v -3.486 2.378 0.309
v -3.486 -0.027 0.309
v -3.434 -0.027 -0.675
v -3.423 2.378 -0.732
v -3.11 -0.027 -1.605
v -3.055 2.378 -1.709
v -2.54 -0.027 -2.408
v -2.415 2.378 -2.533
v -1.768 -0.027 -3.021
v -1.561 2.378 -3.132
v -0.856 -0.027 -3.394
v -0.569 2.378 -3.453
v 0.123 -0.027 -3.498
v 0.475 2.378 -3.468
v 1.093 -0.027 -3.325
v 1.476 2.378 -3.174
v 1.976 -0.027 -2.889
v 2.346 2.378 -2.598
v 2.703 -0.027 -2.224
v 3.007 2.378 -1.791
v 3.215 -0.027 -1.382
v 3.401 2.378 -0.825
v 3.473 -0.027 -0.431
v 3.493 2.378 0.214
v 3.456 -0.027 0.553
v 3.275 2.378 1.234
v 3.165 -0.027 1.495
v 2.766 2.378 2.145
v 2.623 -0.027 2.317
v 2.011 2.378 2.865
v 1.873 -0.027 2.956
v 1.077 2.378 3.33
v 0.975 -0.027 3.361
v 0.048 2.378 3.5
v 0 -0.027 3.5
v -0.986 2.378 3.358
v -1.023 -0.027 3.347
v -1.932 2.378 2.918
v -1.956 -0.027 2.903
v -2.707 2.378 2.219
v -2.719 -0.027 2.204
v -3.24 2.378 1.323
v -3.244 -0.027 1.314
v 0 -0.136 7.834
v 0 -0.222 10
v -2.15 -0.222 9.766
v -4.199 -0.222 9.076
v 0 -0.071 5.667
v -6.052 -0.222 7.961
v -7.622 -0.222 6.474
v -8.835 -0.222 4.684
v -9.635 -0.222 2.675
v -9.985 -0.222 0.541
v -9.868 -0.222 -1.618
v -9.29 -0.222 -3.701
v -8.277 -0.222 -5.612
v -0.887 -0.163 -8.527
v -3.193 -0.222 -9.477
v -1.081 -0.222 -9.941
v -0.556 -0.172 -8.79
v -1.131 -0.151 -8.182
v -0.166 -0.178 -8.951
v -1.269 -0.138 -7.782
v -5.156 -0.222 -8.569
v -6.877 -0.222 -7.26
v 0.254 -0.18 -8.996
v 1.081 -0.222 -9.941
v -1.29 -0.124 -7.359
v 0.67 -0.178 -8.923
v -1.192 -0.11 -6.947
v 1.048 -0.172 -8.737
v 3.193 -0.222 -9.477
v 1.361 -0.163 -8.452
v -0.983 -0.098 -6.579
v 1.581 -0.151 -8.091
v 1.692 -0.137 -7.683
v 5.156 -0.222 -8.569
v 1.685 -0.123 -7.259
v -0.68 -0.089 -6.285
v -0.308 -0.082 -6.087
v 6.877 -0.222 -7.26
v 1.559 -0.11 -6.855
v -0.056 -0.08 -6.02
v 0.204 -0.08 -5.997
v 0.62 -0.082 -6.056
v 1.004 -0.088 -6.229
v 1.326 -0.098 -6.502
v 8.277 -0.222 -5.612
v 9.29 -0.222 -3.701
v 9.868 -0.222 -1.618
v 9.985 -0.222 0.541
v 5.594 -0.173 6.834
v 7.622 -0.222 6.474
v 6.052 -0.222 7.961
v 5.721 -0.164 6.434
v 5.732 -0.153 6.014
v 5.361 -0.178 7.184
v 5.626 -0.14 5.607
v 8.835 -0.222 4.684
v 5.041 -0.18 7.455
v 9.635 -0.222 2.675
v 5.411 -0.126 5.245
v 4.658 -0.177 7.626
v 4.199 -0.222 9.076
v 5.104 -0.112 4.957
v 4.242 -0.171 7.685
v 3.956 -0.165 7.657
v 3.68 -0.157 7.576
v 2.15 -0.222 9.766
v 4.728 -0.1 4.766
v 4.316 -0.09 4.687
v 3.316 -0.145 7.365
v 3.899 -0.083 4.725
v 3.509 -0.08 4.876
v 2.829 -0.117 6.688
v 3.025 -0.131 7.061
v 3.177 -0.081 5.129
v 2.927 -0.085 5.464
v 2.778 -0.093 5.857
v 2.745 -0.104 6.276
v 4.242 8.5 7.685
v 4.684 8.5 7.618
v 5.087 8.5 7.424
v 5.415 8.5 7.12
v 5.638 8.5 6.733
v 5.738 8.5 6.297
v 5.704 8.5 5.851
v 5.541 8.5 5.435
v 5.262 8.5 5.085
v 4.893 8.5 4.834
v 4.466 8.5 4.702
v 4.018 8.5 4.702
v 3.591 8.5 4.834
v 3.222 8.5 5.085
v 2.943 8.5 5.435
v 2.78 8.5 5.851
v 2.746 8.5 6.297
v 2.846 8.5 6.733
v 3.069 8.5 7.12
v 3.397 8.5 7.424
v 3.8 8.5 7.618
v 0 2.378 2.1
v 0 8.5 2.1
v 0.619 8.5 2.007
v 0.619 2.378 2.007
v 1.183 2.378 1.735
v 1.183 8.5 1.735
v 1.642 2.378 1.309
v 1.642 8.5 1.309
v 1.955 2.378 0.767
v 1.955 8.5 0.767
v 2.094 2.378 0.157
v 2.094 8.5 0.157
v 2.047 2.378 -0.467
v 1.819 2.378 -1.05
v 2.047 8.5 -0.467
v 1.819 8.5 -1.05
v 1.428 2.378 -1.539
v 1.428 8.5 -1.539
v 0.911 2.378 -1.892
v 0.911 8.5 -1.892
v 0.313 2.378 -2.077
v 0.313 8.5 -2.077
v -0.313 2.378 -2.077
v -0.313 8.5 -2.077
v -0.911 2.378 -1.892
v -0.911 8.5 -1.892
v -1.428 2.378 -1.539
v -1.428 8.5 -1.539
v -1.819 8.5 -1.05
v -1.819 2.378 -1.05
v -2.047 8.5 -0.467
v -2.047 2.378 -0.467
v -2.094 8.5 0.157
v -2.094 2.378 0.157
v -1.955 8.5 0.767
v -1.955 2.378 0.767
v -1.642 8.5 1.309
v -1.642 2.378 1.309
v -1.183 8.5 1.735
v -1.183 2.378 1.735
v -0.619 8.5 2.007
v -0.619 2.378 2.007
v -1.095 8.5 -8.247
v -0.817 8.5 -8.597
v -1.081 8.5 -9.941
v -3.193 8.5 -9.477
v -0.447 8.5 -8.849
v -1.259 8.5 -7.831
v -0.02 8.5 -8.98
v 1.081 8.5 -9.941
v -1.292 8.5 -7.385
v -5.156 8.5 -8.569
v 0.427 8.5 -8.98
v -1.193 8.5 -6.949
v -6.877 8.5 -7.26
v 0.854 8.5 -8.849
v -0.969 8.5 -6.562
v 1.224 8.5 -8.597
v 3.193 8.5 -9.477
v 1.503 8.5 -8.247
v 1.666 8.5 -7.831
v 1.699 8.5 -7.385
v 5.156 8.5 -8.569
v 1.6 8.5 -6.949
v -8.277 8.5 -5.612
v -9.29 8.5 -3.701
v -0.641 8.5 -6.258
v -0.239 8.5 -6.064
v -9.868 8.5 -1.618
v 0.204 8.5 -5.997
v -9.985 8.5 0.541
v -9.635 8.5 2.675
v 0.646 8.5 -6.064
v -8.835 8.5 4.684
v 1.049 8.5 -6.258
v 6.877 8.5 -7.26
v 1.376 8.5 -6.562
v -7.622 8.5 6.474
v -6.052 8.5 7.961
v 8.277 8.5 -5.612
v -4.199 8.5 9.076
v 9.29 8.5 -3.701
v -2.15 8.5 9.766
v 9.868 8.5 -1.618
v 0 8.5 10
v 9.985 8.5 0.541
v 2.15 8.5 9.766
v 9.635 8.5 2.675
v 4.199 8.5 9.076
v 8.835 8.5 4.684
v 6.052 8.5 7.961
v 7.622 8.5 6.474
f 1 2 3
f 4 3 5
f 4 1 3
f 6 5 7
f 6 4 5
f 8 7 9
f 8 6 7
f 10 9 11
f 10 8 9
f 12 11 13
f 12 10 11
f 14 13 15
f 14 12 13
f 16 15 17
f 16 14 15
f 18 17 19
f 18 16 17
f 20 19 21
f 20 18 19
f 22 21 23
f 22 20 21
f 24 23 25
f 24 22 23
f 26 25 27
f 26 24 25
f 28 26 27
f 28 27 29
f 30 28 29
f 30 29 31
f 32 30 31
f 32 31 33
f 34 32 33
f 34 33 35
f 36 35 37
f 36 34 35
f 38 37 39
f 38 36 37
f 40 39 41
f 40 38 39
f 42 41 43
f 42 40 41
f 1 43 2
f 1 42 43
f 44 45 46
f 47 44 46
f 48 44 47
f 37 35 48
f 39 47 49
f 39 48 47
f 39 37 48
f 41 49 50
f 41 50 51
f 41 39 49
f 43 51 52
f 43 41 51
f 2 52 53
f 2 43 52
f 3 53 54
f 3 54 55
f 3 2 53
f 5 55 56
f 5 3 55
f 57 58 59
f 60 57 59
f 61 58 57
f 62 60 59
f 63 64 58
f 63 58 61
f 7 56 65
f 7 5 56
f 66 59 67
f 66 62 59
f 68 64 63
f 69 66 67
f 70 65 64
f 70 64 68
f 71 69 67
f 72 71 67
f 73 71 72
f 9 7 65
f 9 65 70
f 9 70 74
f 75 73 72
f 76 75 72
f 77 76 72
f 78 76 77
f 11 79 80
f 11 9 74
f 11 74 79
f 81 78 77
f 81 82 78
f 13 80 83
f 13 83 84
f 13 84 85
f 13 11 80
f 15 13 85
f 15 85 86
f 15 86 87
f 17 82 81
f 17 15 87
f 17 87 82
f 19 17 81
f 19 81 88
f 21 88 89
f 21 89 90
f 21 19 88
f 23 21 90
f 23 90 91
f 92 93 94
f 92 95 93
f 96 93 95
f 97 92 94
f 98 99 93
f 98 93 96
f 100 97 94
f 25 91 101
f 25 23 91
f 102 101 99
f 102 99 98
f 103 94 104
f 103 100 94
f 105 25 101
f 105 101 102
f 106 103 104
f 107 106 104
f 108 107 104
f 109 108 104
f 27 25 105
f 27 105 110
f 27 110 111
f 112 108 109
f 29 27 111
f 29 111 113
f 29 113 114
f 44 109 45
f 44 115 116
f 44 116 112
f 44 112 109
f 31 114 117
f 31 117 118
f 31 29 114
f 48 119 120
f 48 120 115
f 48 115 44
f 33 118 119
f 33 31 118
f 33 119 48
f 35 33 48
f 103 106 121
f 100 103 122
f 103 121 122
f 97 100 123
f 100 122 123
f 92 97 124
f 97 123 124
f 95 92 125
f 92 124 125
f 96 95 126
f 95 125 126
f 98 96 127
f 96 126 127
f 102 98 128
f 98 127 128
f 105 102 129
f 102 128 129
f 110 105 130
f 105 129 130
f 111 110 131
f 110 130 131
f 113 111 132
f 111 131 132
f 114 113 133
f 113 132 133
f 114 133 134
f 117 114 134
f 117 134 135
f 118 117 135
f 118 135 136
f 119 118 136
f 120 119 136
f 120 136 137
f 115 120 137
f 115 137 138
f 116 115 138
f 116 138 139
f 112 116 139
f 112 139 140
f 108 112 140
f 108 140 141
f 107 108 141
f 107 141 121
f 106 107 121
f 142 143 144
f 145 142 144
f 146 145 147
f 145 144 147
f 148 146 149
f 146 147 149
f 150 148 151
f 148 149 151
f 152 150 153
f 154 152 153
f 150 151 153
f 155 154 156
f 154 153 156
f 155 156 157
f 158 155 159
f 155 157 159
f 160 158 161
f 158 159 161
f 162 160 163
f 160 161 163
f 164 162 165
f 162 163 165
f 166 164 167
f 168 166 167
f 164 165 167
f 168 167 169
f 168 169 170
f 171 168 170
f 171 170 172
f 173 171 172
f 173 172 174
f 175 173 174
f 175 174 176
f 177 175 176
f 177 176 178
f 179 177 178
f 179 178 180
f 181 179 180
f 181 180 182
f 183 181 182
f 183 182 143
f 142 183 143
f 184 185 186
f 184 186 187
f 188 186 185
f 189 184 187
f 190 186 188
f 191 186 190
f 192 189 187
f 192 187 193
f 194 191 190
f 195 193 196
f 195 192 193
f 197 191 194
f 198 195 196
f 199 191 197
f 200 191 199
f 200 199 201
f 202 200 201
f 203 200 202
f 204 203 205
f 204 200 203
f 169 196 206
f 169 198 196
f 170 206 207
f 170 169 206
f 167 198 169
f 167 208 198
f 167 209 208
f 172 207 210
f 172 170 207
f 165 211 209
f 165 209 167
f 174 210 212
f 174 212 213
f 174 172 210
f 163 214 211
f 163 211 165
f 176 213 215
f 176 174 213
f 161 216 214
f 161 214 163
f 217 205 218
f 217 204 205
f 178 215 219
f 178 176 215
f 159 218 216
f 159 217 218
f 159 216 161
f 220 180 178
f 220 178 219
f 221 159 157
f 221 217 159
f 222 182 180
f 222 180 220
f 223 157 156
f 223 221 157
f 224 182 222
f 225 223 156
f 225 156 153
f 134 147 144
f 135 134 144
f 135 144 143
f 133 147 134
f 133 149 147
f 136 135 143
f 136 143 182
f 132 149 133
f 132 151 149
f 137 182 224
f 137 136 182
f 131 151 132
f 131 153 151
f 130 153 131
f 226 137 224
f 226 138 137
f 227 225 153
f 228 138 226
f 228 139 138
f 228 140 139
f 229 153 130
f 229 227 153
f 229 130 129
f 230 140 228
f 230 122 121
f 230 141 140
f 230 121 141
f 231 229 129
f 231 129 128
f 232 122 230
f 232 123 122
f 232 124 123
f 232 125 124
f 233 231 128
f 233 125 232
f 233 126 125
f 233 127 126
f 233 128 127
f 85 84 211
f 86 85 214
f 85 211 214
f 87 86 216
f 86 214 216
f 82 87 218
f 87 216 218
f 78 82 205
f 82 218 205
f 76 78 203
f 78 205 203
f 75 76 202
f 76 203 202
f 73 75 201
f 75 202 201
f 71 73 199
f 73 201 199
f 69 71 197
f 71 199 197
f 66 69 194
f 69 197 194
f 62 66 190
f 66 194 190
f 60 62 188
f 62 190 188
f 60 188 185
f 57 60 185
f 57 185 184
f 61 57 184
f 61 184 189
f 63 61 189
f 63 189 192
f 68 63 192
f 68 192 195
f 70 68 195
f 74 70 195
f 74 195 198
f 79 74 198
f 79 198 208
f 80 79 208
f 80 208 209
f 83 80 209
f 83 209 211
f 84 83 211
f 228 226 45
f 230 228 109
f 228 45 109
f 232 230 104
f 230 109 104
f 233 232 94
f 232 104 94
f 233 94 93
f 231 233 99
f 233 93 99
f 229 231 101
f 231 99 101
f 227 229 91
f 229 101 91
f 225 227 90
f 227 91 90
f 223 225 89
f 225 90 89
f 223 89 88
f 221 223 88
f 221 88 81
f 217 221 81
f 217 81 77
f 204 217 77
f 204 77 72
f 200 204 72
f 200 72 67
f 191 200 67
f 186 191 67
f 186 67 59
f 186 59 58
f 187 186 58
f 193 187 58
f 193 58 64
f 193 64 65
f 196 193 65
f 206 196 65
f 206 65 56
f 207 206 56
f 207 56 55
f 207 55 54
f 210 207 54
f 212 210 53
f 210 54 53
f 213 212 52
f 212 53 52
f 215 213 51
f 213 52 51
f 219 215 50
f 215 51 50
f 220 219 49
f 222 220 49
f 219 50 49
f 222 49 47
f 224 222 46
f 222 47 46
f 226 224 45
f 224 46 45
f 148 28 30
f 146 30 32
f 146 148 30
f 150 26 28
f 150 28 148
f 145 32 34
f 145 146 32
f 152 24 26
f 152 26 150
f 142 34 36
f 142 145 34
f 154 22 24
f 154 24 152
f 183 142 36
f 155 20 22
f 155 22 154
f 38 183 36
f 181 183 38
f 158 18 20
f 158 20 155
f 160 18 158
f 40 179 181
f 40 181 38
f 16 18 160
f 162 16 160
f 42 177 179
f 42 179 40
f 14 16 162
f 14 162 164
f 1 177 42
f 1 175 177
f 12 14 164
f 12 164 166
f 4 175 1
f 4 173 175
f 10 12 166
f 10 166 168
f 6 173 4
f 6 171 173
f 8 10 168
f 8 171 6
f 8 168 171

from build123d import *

# Parameters (mm, degrees)
BOSS_EXTRUDE1_DEPTH      = 8.5
BOSS_EXTRUDE1_DEPTH_BACK = 2
SKETCH1_R                = 10
SKETCH3_W                = 3.5
SKETCH3_H                = 2.6
SKETCH4_R                = 2.1
CUT_EXTRUDE1_DEPTH       = 17.615368622
SKETCH5_R                = 1.5
CUT_EXTRUDE2_DEPTH       = 17.615368622


with BuildPart() as part:
    # Sketch1 → Boss-Extrude1 (new, two sides: drawn at the far end of the back side and taken through both)
    with BuildSketch(Plane(origin=(0, 0, 0), x_dir=(1, 0, 0), z_dir=(0, 1, 0)).offset(-BOSS_EXTRUDE1_DEPTH_BACK)):
        with Locations(Location((0, 0, 0), (0, 0, 270))):
            Circle(SKETCH1_R)
    extrude(amount=BOSS_EXTRUDE1_DEPTH + BOSS_EXTRUDE1_DEPTH_BACK)

    # Sketch2 → Cut-Revolve1 (revolve, cut)
    with BuildSketch(Plane(origin=(0, 0, 0), x_dir=(0, 0, -1), z_dir=(1, 0, 0))):
        with BuildLine():
            Line((0, 0), (0, -451))
            ThreePointArc((0, -451), (-225.5, -225.5), (0, 0))
        make_face()
    revolve(axis=Axis((0, 0, 0), (0, -1, 0)), mode=Mode.SUBTRACT)

    # Sketch3 → Cut-Revolve2 (revolve, cut)
    with BuildSketch(Plane(origin=(0, 0, 0), x_dir=(0, 0, -1), z_dir=(1, 0, 0)), mode=Mode.PRIVATE) as cut_revolve2_sk:
        with Locations((-1.75, 1.078161392)):
            Rectangle(SKETCH3_W, SKETCH3_H)
    revolve(cut_revolve2_sk.sketch.rotate(Axis((0, 2.378161392, 0), (0, -1, 0)), 84.935699762), axis=Axis((0, 2.378161392, 0), (0, -1, 0)), mode=Mode.SUBTRACT)

    # Sketch4 → Cut-Extrude1 (cut, through all)
    with BuildSketch(Plane(origin=(0, 8.5, 0), x_dir=(1, 0, 0), z_dir=(0, 1, 0))):
        with Locations(Location((0, 0, 0), (0, 0, 270))):
            Circle(SKETCH4_R)
    extrude(amount=-CUT_EXTRUDE1_DEPTH, mode=Mode.SUBTRACT)

    # Sketch5 → Cut-Extrude2 (cut, through all)
    with BuildSketch(Plane(origin=(0, 8.5, 0), x_dir=(1, 0, 0), z_dir=(0, 1, 0))):
        with Locations(Location((0.20360383, 7.497235856, 0), (0, 0, 270))):
            Circle(SKETCH5_R)
        with Locations(Location((4.24204571, -6.185066547, 0), (0, 0, 270))):
            Circle(SKETCH5_R)
    extrude(amount=-CUT_EXTRUDE2_DEPTH, mode=Mode.SUBTRACT)


solid = part.part
